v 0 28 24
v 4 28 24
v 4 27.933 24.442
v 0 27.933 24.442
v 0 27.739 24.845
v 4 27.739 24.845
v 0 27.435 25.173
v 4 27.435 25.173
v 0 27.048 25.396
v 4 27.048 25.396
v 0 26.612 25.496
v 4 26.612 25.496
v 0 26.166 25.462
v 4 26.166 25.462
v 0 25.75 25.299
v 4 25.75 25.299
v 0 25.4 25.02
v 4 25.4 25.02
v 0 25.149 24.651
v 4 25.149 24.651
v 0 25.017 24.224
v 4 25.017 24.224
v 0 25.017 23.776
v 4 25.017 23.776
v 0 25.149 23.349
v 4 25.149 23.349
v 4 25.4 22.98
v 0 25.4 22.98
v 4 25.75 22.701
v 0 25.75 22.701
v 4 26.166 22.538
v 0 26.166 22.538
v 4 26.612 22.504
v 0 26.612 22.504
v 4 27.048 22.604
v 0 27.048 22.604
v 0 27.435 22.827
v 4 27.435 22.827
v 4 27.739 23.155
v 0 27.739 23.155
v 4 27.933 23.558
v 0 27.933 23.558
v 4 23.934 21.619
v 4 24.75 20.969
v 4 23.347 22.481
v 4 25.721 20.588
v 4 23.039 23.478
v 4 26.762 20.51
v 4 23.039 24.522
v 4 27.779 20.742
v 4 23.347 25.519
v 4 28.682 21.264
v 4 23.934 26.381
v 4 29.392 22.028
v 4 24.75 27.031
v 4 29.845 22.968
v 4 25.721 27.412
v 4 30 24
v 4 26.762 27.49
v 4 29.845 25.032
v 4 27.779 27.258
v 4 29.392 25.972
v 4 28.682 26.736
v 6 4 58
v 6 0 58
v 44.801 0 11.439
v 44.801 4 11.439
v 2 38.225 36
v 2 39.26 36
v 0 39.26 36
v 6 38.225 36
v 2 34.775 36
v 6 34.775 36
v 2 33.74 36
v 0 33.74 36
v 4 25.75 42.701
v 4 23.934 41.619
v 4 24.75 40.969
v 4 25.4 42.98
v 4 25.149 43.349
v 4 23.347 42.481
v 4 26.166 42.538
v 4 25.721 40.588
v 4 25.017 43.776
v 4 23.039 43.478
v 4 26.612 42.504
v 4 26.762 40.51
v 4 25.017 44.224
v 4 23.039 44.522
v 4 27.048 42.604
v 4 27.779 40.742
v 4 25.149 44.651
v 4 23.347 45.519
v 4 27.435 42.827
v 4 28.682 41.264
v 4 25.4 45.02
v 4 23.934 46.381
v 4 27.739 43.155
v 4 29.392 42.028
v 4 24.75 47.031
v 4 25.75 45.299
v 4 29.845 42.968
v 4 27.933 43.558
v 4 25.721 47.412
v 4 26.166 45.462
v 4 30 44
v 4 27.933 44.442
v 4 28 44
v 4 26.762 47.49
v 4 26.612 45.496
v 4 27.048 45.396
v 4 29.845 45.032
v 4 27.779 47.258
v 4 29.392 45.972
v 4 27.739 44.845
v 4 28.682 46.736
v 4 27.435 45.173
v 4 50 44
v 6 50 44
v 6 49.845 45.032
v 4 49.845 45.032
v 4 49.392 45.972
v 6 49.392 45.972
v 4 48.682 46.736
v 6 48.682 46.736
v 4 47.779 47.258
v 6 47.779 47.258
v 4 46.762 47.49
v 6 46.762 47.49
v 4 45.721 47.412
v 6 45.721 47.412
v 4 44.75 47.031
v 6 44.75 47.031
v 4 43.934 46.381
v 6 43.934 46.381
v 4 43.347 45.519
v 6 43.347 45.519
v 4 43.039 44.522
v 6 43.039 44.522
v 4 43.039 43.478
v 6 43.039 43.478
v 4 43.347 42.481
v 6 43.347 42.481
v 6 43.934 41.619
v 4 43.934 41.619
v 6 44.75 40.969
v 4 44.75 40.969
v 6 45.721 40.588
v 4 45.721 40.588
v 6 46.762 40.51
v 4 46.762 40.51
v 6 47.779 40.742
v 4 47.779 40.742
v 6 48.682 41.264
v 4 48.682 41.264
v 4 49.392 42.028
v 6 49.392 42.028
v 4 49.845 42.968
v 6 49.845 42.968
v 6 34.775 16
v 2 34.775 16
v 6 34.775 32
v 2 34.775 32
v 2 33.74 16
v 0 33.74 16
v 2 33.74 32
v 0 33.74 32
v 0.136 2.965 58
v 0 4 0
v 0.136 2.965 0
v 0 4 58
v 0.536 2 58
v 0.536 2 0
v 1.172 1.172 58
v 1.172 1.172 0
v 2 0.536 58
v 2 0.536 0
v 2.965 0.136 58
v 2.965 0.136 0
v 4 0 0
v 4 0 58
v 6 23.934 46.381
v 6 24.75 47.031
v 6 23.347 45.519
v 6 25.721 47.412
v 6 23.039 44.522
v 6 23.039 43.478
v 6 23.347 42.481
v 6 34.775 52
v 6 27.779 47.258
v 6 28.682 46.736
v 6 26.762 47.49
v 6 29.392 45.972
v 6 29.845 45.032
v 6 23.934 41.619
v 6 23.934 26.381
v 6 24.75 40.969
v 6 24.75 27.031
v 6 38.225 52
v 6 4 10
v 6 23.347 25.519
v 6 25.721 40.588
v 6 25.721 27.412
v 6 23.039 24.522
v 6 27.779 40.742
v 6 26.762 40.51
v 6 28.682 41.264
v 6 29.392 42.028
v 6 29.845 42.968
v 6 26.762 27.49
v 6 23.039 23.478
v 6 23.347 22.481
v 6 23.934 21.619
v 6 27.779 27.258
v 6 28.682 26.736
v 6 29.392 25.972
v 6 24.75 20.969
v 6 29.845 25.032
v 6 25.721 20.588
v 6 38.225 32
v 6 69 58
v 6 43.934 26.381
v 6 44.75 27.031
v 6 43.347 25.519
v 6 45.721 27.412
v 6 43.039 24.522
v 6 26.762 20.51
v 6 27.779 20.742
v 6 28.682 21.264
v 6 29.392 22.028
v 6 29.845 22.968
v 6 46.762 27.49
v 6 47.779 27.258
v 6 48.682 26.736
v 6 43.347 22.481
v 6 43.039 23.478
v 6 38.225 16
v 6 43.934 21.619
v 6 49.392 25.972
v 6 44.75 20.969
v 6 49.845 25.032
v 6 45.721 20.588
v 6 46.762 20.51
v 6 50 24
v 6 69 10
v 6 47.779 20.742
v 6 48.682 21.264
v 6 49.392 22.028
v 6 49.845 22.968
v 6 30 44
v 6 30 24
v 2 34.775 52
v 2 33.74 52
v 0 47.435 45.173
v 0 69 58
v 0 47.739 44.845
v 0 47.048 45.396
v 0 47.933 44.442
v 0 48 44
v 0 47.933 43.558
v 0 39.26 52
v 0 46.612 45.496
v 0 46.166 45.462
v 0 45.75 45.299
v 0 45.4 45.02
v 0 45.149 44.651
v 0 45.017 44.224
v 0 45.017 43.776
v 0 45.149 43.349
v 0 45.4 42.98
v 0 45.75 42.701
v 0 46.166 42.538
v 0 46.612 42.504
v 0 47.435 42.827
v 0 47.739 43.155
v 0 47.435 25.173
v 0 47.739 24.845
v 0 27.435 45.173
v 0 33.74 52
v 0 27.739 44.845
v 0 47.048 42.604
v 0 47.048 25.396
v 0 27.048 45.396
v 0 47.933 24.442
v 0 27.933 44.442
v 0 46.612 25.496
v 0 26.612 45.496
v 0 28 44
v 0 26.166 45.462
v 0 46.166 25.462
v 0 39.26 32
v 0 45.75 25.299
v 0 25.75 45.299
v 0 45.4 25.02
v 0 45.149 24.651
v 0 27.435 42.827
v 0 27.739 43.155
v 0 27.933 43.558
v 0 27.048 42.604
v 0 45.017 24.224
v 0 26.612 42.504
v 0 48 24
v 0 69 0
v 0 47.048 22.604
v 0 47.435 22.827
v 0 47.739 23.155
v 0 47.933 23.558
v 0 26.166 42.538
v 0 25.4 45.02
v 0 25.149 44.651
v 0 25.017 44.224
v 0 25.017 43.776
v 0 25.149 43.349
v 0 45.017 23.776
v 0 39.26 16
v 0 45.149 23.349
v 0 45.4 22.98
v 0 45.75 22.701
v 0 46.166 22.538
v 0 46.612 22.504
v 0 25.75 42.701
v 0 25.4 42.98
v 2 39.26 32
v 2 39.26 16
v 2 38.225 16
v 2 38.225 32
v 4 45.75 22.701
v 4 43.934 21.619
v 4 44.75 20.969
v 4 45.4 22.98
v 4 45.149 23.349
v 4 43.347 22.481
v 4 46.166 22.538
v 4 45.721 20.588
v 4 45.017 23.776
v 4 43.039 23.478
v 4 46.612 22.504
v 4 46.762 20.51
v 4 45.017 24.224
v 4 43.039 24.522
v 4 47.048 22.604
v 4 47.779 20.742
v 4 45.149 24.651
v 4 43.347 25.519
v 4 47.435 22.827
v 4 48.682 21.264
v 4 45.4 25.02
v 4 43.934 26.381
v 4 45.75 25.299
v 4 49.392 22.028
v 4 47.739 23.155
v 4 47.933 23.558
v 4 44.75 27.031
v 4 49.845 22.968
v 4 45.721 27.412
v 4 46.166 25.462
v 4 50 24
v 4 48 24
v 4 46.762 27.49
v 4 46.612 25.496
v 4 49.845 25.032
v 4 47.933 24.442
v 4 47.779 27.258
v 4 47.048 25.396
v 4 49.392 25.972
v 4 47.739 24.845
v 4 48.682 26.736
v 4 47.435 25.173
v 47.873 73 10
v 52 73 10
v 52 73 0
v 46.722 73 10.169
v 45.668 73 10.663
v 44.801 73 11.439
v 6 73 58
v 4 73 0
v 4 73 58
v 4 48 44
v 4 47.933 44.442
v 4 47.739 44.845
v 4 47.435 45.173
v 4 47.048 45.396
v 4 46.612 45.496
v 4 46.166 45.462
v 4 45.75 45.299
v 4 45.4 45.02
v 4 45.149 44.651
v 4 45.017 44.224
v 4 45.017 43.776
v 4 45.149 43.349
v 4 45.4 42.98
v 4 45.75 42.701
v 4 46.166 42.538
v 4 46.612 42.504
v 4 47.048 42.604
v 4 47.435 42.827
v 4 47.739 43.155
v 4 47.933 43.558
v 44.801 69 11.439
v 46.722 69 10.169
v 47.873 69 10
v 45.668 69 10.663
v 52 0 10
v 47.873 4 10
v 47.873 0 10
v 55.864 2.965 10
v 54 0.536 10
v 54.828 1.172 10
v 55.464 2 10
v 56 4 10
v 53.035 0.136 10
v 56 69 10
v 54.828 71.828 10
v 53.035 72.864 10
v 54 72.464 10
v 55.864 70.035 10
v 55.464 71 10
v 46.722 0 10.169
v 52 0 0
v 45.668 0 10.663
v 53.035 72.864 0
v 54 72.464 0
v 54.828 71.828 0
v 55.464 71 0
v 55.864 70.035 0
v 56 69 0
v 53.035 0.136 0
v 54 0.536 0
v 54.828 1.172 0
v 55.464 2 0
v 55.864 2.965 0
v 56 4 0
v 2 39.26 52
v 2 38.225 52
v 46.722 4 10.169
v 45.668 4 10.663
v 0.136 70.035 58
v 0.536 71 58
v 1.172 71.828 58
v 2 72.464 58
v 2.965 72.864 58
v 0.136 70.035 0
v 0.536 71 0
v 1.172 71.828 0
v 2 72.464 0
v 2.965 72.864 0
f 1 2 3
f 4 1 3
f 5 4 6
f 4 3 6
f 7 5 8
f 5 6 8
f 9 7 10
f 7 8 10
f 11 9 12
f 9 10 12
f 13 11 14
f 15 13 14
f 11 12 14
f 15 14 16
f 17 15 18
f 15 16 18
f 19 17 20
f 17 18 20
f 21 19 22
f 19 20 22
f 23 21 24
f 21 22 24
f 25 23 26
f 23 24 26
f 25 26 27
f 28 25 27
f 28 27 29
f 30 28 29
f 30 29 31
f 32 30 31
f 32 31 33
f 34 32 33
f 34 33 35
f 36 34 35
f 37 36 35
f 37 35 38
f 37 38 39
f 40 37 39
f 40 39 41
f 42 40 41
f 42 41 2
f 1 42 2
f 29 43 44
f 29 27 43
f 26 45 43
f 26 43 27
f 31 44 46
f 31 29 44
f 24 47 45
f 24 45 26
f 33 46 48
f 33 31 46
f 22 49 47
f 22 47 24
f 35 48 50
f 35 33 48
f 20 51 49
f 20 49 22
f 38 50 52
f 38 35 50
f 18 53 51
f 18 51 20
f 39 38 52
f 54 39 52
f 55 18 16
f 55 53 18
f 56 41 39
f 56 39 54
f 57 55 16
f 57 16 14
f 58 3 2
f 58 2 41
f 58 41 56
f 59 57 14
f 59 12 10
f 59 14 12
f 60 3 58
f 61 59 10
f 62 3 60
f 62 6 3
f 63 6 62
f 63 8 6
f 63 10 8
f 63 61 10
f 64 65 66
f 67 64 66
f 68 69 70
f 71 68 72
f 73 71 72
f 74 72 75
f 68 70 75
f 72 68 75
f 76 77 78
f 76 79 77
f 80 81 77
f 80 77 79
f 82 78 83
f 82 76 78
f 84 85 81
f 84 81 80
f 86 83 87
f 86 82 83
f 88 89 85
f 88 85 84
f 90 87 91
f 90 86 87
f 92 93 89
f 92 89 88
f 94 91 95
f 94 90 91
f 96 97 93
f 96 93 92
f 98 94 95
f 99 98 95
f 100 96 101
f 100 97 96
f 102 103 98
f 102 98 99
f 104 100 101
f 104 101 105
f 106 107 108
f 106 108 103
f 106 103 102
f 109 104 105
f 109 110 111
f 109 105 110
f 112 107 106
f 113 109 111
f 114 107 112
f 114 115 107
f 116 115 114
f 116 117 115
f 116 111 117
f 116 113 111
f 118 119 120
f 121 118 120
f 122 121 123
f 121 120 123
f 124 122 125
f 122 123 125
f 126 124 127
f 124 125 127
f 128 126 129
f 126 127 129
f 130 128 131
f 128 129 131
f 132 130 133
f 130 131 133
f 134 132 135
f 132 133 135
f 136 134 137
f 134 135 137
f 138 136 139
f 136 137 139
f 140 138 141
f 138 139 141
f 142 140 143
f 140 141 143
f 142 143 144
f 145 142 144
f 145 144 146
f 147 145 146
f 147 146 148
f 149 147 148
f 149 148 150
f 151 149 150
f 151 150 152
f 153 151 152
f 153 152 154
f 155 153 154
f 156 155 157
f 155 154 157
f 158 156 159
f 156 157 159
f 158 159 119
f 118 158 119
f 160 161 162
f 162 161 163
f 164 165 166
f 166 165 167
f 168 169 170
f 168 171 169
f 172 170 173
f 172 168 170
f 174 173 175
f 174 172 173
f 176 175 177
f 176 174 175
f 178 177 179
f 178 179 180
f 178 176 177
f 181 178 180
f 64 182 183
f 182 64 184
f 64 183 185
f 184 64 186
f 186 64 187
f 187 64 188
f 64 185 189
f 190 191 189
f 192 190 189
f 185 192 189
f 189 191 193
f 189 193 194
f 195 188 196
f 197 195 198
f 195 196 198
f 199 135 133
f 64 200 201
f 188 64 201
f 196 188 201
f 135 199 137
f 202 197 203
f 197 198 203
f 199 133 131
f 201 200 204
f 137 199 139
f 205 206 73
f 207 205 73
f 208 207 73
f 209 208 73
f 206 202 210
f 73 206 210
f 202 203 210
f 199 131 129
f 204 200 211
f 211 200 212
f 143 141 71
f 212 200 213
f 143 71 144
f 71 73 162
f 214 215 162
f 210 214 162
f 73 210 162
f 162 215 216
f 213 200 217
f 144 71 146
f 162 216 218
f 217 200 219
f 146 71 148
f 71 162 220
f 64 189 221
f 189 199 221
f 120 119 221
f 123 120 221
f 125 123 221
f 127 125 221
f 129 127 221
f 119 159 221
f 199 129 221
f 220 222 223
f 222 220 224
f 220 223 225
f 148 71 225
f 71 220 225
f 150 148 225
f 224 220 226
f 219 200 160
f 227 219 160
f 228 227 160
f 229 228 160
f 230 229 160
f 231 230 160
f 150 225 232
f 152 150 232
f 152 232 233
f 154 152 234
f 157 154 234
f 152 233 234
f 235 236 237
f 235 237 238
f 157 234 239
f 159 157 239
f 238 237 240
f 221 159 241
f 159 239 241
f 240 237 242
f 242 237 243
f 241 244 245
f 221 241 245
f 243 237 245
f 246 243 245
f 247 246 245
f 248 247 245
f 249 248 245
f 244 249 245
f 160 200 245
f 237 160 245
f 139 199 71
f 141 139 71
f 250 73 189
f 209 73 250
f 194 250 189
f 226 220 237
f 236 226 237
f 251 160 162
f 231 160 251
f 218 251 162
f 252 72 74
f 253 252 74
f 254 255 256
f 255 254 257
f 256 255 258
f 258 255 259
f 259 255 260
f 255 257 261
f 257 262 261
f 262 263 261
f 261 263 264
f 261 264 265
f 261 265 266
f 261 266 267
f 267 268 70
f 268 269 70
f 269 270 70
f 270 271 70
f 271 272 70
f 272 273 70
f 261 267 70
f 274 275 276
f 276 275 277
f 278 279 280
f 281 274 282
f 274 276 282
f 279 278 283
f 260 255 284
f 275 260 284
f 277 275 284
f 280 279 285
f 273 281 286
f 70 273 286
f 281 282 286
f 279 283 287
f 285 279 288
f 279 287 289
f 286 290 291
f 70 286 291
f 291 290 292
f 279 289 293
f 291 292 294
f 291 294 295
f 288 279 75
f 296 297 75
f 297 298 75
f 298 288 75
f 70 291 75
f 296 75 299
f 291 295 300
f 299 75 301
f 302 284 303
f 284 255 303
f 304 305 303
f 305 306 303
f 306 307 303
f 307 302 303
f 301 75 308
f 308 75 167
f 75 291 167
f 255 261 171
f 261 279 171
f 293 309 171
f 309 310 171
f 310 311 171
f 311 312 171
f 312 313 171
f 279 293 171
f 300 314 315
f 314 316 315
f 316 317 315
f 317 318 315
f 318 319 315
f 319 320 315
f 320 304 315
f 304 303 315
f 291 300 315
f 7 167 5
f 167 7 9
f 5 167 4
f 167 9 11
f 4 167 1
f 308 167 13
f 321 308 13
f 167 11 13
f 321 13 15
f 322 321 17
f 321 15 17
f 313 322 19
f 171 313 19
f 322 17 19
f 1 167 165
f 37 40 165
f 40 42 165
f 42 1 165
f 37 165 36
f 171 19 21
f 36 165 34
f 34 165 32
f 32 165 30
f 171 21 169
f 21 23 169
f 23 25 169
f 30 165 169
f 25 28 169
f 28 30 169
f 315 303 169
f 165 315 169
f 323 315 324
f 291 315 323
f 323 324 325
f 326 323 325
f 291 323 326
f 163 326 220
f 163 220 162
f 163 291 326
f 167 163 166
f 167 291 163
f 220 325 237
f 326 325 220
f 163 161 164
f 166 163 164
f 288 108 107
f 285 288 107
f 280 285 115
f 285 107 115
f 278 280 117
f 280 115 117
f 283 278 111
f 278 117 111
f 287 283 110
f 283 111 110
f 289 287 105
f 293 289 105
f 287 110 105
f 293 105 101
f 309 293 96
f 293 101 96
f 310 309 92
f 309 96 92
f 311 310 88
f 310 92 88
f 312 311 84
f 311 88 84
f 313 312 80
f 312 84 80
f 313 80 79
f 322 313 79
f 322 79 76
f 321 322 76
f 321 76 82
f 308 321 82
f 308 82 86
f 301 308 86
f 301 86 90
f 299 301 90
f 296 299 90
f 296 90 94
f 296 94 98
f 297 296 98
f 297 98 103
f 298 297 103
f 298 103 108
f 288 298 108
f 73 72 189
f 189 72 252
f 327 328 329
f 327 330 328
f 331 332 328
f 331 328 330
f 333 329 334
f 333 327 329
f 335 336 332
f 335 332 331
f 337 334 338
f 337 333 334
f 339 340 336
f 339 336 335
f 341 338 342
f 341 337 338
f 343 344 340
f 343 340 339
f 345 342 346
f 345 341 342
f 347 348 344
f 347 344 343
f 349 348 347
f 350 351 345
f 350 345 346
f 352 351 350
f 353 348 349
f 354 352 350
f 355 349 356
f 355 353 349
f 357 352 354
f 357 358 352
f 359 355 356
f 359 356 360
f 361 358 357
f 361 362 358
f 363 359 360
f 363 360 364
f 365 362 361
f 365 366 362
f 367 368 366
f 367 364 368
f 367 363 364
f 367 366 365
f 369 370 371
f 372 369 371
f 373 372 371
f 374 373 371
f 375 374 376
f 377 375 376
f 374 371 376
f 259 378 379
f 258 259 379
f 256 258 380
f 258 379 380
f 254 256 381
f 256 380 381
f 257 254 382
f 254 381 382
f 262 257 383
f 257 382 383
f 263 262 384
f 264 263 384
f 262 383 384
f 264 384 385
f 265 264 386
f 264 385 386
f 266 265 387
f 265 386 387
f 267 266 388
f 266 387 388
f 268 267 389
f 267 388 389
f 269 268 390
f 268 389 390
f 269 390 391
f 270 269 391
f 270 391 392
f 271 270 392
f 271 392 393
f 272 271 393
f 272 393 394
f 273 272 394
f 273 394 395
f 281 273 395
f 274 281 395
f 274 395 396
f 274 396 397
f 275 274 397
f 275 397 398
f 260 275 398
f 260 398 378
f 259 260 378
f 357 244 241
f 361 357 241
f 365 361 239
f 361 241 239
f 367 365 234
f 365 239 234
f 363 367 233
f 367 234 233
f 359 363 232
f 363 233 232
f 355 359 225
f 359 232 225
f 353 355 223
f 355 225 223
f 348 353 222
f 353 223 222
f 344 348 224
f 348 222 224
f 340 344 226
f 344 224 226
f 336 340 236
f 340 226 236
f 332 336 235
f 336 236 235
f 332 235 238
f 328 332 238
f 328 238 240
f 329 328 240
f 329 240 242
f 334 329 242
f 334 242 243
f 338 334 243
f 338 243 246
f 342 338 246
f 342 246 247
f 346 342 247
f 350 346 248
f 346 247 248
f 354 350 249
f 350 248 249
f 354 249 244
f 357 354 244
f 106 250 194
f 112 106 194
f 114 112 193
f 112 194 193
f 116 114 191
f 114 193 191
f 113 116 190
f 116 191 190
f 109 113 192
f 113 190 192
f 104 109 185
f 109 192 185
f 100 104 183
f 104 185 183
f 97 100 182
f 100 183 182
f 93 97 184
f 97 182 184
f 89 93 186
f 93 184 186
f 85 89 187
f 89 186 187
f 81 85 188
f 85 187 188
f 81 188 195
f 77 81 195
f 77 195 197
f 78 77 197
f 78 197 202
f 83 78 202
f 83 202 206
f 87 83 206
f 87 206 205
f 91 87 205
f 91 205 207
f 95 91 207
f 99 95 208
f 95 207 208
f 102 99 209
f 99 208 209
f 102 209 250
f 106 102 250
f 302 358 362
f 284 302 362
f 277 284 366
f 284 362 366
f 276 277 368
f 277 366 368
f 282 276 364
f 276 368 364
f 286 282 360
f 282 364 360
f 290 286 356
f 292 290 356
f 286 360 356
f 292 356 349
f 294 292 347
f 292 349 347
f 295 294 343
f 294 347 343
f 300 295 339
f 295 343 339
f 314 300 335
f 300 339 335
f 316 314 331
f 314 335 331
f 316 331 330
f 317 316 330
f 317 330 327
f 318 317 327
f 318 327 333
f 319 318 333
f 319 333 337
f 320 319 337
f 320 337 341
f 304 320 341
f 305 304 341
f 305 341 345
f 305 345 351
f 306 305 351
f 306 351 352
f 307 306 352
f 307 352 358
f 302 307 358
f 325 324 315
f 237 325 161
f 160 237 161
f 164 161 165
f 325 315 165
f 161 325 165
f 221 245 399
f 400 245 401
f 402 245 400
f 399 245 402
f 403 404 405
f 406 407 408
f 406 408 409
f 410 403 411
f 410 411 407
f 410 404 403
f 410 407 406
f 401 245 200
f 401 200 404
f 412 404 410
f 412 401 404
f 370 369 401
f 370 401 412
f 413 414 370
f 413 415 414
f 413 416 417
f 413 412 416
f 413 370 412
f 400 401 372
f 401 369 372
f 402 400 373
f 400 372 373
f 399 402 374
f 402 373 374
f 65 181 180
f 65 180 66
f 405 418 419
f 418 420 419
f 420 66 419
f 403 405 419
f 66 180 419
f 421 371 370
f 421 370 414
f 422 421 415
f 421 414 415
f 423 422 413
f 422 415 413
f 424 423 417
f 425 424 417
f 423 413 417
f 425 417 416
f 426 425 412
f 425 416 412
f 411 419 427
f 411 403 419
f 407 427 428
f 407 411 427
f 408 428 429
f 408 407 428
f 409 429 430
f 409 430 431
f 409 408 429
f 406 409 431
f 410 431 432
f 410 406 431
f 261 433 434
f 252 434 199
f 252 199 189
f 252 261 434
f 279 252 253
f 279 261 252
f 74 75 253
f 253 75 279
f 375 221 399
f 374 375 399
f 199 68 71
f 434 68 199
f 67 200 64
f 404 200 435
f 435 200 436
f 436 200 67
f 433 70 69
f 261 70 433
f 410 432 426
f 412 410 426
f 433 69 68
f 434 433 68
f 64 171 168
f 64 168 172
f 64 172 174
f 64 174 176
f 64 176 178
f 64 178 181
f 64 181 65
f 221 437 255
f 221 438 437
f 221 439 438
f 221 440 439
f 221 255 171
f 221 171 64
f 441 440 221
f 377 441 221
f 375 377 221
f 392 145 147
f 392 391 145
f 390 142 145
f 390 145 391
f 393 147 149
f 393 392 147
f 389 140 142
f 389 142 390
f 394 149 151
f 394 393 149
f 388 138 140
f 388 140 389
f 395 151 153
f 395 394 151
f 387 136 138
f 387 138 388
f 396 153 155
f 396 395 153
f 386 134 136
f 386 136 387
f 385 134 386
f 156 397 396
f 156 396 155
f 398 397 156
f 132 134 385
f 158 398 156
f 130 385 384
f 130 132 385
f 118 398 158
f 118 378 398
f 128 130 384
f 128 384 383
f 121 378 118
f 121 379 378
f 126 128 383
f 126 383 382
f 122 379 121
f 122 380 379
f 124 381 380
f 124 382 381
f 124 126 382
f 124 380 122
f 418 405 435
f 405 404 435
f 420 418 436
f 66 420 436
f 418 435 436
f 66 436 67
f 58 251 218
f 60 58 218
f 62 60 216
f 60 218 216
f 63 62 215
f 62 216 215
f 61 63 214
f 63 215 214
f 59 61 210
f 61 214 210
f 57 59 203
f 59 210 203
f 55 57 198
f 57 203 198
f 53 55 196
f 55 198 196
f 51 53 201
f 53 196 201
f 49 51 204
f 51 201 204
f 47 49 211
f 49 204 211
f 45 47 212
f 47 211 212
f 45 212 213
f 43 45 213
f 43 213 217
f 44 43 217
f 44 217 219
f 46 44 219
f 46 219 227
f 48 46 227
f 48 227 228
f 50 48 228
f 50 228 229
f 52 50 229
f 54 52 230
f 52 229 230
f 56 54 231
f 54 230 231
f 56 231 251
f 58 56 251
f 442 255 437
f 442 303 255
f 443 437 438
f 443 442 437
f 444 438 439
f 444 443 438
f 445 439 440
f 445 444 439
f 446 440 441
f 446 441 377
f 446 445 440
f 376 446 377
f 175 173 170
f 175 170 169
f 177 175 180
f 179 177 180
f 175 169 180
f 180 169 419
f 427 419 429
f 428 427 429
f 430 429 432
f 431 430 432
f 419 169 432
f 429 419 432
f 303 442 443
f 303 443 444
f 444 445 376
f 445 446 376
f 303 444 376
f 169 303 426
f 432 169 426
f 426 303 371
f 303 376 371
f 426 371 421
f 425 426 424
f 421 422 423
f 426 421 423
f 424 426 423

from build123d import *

# Parameters (mm, degrees)
F0_W      = 56
F0_H      = 73
F1_DEPTH  = 10
F2_W      = 40
F2_H      = 4
F3_DEPTH  = 48
F5_DEPTH  = 73.001
F6_R      = 4
F7_W      = 1.035
F7_H      = 16
F8_DEPTH  = 2
F7_W_2    = 3.45
F9_DEPTH  = 6
F10_R     = 3.5
F10_R_2   = 1.5
F11_DEPTH = 2
F12_DEPTH = 6


with BuildPart() as f1:
    # F0 (on Top) → F1 (new body)
    with BuildSketch(Plane.XY):
        with Locations((28, 36.5)):
            Rectangle(F0_W, F0_H)
    extrude(amount=F1_DEPTH)

    # F2 (on face) → F3 (join)
    with BuildSketch(Plane.XY.offset(10)):
        Polygon((6, 73), (0, 73), (0, 0), (6, 0), (6, 4), (6, 69), align=None)
        with Locations((26, 71)):
            Rectangle(F2_W, F2_H)
        with Locations((26, 2)):
            Rectangle(F2_W, F2_H)
    extrude(amount=F3_DEPTH)

    # F4 (on face) → F5 (cut, through all)
    with BuildSketch(Plane.XZ):
        Polygon((6, 58), (46, 10), (46, 58), align=None)
    extrude(amount=-F5_DEPTH, mode=Mode.SUBTRACT)

    # F6
    f6_edges = [f1.edges().sort_by_distance(p)[0] for p in [
        (0, 0, 29),
        (56, 0, 5),
        (46, 2, 10),
        (46, 71, 10),
        (56, 73, 5),
        (0, 73, 29),
    ]]
    fillet(f6_edges, radius=F6_R)

    # F7 (on face) → F8 (cut)
    with BuildSketch(Plane(origin=(0, 0, 0), x_dir=(0, -1, 0), z_dir=(-1, 0, 0))):
        with Locations((-38.7425, 44)):
            Rectangle(F7_W, F7_H)
        with Locations((-34.2575, 44)):
            Rectangle(F7_W, F7_H)
        with Locations((-34.2575, 24)):
            Rectangle(F7_W, F7_H)
        with Locations((-38.7425, 24)):
            Rectangle(F7_W, F7_H)
    extrude(amount=-F8_DEPTH, mode=Mode.SUBTRACT)

    # F7 (on face) → F9 (cut, through all)
    with BuildSketch(Plane(origin=(0, 0, 0), x_dir=(0, -1, 0), z_dir=(-1, 0, 0))):
        with Locations((-36.5, 44)):
            Rectangle(F7_W_2, F7_H)
        with Locations((-36.5, 24)):
            Rectangle(F7_W_2, F7_H)
    extrude(amount=-F9_DEPTH, mode=Mode.SUBTRACT)

    # F10 (on face) → F11 (cut)
    with BuildSketch(Plane.YZ.offset(6)):
        with Locations((26.5, 44)):
            Circle(F10_R)
        with Locations((26.5, 44)):
            Circle(F10_R_2, mode=Mode.SUBTRACT)
        with Locations((46.5, 44)):
            Circle(F10_R)
        with Locations((46.5, 44)):
            Circle(F10_R_2, mode=Mode.SUBTRACT)
        with Locations((46.5, 24)):
            Circle(F10_R)
        with Locations((46.5, 24)):
            Circle(F10_R_2, mode=Mode.SUBTRACT)
        with Locations((26.5, 24)):
            Circle(F10_R)
        with Locations((26.5, 24)):
            Circle(F10_R_2, mode=Mode.SUBTRACT)
    extrude(amount=-F11_DEPTH, mode=Mode.SUBTRACT)

    # F10 (on face) → F12 (cut, through all)
    with BuildSketch(Plane.YZ.offset(6)):
        with Locations((26.5, 44)):
            Circle(F10_R_2)
        with Locations((46.5, 44)):
            Circle(F10_R_2)
        with Locations((46.5, 24)):
            Circle(F10_R_2)
        with Locations((26.5, 24)):
            Circle(F10_R_2)
    extrude(amount=-F12_DEPTH, mode=Mode.SUBTRACT)


solid = f1.part
